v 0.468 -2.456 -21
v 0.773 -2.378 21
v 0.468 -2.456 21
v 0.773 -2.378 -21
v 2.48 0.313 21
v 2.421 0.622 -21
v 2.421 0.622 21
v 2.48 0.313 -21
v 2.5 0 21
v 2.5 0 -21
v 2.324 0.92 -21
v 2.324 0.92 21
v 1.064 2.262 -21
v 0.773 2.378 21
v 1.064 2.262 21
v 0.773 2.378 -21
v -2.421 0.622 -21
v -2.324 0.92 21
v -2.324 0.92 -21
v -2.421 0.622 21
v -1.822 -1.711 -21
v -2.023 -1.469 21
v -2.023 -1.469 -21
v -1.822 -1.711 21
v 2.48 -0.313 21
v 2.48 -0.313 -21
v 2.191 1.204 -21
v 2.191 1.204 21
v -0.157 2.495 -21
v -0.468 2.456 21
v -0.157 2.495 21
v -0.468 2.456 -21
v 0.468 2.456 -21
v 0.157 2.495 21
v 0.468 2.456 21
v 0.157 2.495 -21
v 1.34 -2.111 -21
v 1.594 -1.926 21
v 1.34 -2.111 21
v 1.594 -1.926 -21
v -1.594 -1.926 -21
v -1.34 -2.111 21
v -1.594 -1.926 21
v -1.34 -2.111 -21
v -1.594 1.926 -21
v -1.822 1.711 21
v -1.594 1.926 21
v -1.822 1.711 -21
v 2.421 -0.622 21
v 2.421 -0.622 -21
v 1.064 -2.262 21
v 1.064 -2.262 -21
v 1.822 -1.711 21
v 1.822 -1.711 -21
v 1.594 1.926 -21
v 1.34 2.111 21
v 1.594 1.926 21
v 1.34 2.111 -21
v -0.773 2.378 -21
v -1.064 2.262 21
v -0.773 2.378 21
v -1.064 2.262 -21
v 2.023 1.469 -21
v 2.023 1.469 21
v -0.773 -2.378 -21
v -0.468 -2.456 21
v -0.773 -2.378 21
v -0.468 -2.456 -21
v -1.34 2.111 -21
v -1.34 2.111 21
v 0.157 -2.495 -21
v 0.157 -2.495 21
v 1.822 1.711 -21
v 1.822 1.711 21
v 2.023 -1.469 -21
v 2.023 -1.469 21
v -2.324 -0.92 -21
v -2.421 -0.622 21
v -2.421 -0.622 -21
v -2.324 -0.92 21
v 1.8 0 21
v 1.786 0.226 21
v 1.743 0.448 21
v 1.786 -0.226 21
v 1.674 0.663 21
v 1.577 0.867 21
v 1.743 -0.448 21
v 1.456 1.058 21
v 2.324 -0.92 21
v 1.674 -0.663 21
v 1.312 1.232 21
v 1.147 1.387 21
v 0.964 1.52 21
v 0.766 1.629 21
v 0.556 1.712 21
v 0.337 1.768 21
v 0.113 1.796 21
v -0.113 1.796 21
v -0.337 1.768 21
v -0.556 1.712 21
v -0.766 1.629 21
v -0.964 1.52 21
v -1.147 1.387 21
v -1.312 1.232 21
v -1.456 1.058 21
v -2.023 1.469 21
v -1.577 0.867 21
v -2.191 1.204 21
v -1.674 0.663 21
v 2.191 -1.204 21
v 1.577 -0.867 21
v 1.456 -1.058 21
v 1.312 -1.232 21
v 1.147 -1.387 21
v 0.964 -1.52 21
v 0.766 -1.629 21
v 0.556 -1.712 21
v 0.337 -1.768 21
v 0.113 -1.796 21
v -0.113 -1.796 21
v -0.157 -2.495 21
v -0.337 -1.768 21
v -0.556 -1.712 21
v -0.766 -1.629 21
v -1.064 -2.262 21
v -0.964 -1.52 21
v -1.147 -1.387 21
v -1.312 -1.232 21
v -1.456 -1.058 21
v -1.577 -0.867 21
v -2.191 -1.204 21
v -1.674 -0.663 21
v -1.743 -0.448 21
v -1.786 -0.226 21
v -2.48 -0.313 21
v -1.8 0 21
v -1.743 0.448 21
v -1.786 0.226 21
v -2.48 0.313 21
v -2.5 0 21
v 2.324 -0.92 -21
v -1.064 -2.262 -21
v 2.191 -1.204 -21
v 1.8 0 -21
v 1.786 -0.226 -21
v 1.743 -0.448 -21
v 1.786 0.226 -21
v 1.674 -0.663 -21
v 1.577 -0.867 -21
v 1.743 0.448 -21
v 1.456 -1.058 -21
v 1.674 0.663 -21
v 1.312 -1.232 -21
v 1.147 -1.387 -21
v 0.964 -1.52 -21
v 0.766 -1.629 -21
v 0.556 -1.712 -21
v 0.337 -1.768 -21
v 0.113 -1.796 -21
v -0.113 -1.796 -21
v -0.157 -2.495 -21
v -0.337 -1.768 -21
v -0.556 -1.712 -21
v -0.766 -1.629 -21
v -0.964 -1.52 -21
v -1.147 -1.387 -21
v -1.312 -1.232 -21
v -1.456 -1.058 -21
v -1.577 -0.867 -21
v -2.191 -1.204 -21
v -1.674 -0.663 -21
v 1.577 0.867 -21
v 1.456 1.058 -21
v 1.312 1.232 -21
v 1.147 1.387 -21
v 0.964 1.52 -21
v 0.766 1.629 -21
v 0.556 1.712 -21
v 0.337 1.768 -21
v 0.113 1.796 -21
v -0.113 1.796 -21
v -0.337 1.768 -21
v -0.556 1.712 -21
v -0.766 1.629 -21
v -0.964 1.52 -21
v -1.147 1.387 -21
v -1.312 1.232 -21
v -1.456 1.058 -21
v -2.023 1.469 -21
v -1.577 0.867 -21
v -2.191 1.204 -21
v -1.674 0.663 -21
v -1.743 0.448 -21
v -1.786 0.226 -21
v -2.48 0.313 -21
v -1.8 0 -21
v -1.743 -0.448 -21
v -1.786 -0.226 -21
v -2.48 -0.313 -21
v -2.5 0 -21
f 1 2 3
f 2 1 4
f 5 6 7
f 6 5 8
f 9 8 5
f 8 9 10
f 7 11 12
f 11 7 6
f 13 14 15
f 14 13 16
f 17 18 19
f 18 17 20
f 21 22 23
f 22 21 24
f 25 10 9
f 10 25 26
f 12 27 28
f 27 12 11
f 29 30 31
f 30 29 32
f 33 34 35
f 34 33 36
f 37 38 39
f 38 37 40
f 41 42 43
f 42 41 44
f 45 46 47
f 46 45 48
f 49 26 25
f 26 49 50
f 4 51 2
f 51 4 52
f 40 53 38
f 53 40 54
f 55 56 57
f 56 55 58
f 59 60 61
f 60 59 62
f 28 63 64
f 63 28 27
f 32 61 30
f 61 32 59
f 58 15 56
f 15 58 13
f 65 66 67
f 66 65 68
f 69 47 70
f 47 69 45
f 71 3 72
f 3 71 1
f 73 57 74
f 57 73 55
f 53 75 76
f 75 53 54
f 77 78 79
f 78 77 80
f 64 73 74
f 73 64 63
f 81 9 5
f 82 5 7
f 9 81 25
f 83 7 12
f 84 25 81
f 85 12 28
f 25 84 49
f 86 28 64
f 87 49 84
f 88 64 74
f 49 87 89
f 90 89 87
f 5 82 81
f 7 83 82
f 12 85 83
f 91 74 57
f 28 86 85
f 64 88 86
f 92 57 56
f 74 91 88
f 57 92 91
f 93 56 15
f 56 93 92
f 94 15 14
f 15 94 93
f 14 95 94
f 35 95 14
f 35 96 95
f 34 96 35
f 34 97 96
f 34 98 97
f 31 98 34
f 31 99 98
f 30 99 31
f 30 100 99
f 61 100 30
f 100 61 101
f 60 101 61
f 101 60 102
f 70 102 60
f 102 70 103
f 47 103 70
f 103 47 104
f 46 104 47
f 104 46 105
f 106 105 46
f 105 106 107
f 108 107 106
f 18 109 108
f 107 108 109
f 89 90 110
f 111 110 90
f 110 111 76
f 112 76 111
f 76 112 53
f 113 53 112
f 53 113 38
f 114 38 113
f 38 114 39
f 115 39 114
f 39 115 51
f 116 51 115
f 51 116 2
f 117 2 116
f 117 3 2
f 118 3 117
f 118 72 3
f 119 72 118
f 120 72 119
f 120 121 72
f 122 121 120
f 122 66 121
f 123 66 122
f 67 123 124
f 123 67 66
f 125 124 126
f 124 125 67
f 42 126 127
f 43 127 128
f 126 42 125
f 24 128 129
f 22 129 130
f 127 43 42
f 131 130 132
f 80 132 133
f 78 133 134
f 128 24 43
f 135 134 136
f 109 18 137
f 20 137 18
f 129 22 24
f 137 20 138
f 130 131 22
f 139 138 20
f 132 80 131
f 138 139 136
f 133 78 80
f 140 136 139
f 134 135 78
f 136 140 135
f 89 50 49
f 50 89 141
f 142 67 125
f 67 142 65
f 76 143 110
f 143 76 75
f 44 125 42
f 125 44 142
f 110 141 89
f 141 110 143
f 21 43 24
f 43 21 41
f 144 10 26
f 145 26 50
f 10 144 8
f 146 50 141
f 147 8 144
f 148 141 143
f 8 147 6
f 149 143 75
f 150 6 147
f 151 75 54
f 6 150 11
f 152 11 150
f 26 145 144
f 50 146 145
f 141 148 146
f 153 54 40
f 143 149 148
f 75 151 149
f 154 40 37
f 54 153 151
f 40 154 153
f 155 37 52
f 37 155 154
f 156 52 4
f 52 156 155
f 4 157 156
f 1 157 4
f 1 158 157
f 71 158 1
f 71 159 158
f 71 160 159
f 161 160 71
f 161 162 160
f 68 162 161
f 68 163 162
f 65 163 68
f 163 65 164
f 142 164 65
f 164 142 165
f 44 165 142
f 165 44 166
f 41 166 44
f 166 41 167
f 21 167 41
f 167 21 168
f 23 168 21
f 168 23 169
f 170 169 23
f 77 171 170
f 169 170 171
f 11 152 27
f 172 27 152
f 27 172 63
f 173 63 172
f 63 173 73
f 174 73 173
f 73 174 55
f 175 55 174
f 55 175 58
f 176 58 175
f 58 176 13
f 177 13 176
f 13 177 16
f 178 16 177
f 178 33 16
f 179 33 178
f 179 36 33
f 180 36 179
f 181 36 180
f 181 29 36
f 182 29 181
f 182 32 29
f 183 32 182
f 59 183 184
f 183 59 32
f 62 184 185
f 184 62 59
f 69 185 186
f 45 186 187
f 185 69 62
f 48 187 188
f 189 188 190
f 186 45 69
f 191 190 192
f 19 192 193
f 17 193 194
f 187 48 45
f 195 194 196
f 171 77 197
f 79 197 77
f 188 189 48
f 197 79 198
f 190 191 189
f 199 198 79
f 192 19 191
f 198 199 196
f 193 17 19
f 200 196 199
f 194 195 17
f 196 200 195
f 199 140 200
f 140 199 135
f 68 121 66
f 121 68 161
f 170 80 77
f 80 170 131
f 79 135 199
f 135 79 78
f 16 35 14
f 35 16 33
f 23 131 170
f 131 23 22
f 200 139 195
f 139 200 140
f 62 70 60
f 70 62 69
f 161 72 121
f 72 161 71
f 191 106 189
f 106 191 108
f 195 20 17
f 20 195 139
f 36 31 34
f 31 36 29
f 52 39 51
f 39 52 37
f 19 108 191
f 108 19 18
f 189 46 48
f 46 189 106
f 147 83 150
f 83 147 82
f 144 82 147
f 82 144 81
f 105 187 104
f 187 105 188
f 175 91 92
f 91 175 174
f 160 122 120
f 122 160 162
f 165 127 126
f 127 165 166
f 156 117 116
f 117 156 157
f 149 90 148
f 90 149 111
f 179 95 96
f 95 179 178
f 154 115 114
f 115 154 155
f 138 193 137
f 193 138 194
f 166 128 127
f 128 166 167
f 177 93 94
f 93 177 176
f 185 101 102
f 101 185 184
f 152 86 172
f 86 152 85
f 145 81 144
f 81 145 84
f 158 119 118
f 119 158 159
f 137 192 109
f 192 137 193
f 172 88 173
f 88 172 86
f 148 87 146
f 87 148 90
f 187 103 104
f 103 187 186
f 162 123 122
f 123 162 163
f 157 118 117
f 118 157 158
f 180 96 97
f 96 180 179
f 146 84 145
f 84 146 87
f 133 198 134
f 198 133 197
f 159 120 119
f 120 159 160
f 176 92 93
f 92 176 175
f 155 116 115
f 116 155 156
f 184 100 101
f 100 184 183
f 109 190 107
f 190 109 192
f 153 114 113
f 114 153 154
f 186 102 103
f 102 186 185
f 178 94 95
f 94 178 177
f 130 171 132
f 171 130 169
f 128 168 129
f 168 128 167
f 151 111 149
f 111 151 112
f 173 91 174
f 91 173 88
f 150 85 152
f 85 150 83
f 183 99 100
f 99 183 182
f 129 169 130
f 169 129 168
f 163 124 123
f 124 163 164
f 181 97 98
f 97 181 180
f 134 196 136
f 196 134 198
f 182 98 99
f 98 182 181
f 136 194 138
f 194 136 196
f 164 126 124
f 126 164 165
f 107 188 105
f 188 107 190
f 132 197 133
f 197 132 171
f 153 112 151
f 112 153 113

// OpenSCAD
$fn = 50;


difference() {
	union() {
		translate(v = [0, 0, -21.0000000000]) {
			cylinder(h = 42, r = 2.5000000000);
		}
	}
	union() {
		#translate(v = [0, 0, -100.0000000000]) {
			cylinder(h = 200, r = 1.8000000000);
		}
	}
}
